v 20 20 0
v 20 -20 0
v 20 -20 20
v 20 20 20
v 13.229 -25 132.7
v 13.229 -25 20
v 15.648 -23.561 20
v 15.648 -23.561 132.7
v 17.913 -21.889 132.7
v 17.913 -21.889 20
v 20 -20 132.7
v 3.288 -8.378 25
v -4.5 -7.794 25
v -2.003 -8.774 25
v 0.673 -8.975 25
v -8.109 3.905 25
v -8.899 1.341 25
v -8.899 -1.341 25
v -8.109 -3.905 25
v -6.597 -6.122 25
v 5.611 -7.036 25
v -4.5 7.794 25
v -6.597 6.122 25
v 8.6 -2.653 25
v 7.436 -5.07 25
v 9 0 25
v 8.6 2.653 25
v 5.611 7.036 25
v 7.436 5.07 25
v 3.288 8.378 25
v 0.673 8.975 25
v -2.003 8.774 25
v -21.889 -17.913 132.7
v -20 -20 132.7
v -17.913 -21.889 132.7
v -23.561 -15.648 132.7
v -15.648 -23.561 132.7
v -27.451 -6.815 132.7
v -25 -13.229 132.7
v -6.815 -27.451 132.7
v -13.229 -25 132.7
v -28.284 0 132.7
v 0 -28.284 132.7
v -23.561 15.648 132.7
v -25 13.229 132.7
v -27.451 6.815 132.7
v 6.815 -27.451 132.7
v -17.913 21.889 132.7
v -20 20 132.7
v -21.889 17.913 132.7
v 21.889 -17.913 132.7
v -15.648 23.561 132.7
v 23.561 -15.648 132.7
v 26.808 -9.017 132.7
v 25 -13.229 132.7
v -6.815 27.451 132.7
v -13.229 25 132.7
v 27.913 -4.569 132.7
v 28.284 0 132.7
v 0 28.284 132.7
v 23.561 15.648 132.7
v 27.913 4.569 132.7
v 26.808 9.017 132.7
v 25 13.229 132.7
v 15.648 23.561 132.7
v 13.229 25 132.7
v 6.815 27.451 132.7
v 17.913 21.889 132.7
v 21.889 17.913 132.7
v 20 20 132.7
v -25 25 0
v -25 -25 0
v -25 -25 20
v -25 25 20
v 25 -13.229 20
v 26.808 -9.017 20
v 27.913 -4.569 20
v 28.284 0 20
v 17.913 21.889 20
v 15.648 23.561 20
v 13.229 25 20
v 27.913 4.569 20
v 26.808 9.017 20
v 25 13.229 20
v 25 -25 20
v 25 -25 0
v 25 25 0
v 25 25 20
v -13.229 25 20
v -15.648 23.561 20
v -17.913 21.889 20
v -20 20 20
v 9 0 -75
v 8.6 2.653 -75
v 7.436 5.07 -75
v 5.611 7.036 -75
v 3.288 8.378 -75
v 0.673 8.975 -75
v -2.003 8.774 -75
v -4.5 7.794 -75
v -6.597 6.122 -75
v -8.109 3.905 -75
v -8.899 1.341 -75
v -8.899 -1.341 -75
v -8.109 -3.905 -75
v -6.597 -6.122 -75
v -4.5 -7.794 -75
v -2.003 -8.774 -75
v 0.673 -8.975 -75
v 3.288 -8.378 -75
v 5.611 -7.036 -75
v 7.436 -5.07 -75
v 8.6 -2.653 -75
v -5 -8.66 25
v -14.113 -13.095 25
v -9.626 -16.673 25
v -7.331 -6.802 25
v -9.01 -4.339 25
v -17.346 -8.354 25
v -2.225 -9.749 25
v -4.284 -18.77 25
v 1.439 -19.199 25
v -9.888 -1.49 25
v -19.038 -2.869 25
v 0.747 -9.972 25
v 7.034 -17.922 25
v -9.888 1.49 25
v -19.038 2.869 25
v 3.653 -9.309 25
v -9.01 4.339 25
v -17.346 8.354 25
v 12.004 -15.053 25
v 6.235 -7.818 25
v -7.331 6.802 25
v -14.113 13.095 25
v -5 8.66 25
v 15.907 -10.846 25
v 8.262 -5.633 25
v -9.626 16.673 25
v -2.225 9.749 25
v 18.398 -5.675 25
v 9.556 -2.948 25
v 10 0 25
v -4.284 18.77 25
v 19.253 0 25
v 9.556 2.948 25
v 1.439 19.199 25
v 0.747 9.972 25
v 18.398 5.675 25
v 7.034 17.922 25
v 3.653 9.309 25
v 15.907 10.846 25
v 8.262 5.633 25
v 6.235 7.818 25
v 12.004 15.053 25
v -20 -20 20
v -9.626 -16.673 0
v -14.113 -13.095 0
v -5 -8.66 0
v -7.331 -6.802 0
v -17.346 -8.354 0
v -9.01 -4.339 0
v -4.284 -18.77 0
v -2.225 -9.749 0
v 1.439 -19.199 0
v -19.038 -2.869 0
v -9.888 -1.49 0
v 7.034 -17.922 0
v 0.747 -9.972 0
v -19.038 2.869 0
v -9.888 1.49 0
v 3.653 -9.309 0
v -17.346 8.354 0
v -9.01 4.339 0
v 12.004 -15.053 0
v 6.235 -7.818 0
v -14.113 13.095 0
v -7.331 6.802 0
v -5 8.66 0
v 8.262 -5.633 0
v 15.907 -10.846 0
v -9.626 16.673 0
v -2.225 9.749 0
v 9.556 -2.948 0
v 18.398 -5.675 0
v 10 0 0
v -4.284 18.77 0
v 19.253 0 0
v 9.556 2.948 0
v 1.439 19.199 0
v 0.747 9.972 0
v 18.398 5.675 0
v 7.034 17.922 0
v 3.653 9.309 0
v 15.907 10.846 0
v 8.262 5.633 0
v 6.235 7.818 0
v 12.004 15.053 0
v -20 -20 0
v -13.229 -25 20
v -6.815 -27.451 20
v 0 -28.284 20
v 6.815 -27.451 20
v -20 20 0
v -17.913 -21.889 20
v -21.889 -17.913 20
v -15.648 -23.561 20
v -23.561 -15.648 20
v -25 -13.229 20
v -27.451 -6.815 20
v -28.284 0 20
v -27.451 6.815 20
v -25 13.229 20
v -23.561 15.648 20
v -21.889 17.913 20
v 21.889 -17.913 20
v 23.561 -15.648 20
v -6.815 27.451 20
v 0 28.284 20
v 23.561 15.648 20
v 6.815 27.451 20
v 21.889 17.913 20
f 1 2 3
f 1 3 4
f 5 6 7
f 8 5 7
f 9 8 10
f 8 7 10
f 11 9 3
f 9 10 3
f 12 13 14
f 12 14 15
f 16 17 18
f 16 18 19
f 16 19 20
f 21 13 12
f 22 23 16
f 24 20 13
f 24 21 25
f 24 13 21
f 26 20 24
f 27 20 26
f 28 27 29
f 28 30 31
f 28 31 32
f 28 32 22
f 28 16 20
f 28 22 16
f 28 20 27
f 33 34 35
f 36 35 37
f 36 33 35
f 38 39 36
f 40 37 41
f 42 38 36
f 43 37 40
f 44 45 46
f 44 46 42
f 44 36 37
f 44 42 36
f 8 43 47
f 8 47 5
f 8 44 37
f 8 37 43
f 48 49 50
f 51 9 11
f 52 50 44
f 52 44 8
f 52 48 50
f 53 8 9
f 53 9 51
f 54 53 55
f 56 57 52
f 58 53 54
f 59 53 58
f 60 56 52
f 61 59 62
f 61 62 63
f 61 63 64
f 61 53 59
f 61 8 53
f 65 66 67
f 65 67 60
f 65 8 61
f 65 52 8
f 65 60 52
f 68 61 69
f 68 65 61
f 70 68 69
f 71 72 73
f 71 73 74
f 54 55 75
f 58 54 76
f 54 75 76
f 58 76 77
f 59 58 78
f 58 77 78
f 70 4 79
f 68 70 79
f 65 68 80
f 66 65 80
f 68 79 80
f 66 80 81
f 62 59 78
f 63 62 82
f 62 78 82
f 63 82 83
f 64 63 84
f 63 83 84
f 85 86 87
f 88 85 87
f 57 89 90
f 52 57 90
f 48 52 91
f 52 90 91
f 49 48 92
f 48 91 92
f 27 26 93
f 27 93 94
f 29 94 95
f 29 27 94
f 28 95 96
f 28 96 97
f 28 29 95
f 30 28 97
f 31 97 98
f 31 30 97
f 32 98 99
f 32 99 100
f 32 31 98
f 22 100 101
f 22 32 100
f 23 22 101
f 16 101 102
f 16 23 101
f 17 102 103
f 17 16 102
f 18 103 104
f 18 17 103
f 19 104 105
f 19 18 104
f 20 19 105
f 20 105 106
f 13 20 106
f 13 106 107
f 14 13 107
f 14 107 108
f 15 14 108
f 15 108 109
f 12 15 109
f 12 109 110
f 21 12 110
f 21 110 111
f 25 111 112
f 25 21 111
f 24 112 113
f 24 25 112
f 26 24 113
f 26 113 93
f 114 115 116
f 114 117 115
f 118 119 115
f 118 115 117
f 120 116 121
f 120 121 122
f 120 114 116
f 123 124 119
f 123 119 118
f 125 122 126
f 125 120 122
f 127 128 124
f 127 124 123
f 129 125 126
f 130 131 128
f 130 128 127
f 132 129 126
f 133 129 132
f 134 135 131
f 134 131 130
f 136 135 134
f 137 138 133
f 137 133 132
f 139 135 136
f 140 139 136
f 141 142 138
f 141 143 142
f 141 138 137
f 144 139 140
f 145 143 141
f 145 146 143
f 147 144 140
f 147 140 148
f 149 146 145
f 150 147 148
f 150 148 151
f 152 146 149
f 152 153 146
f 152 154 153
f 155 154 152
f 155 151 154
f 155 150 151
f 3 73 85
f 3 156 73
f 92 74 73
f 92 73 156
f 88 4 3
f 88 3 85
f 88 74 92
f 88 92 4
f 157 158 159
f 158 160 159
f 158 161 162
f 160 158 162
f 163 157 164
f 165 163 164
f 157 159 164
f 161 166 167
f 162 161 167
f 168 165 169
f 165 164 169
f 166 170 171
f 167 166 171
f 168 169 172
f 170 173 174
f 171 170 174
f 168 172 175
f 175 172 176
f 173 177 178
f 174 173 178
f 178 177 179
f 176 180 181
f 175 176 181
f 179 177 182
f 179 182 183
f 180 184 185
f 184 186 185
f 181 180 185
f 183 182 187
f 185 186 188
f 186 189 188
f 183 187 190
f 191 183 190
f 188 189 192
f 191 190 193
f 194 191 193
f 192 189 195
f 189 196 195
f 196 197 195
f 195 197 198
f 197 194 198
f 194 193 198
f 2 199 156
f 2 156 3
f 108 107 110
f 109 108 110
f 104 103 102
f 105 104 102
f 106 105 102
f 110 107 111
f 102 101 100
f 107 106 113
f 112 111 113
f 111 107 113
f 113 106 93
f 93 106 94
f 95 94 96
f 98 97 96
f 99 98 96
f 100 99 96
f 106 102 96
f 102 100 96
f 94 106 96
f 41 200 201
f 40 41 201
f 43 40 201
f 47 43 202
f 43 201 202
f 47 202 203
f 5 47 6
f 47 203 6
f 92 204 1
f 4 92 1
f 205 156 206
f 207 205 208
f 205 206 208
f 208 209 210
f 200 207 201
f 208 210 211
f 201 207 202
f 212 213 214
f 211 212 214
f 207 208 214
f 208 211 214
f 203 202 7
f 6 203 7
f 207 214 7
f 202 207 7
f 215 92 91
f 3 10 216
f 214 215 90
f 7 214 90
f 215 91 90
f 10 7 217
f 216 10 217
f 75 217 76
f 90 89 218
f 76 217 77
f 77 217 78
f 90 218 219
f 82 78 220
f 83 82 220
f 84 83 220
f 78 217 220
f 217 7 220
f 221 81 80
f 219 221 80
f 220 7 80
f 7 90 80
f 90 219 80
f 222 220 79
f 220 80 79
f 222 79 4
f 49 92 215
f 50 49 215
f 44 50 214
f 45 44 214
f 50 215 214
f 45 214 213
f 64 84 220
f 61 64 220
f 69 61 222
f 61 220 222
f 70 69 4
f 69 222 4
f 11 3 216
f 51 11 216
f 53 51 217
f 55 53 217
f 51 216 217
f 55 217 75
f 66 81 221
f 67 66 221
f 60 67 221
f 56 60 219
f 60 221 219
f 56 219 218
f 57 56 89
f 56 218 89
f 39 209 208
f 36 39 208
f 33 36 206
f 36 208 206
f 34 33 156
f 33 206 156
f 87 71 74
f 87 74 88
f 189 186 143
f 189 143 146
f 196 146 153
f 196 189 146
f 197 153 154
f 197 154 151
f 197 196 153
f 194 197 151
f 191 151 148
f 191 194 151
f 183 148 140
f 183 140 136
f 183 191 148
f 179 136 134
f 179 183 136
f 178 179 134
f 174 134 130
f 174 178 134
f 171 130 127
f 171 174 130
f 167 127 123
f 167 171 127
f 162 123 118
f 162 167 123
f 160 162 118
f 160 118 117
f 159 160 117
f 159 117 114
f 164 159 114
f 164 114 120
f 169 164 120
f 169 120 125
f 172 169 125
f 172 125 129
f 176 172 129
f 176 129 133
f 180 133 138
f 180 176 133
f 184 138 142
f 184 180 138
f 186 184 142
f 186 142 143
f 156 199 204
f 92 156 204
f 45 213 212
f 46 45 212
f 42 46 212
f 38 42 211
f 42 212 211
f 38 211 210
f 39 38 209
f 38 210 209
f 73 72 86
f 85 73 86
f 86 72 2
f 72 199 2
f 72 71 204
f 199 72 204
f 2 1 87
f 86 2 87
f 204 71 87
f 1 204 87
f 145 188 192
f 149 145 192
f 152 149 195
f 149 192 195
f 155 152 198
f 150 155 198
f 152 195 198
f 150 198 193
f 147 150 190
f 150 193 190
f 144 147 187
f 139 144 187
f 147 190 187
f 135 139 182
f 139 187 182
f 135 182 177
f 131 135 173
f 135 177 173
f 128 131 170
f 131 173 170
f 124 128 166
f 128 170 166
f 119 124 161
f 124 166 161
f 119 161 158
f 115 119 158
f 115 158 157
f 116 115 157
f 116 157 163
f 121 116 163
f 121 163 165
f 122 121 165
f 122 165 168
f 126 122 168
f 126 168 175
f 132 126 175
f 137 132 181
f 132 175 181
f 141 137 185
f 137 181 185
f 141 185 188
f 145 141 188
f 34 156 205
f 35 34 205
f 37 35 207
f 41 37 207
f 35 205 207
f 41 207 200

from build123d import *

# Parameters (mm, degrees)
F0_R     = 19.2528959131
F0_R_2   = 10
F1_DEPTH = 25
F0_W     = 50
F0_H     = 50
F0_W_2   = 40
F0_H_2   = 40
F2_DEPTH = 20
F3_R     = 9
F4_DEPTH = 100
F5_W     = 40
F5_H     = 40
F6_DEPTH = 112.7


with BuildPart() as f1:
    # F0 (on Top) → F1 (new body)
    with BuildSketch(Plane.XY):
        Circle(F0_R)
        Circle(F0_R_2, mode=Mode.SUBTRACT)
    extrude(amount=F1_DEPTH)


with BuildPart() as f2:
    # F0 (on Top) → F2 (new body)
    with BuildSketch(Plane.XY):
        Rectangle(F0_W, F0_H)
        Rectangle(F0_W_2, F0_H_2, mode=Mode.SUBTRACT)
    extrude(amount=F2_DEPTH)


with BuildPart() as f4:
    # F3 (on face) → F4 (new body)
    with BuildSketch(Plane.XY.offset(25)):
        Circle(F3_R)
    extrude(amount=-F4_DEPTH)


with BuildPart() as f6:
    # F5 (on face) → F6 (new body)
    with BuildSketch(Plane.XY.offset(20)):
        with BuildLine():
            ThreePointArc((25, -13.2287565553), (27.4509269533, -6.8151749359), (28.2842712475, 0))
            ThreePointArc((28.2842712475, 0), (27.4509269533, 6.8151749359), (25, 13.2287565553))
            Line((25, 13.2287565553), (25, -13.2287565553))
        make_face()
        with BuildLine():
            Line((25, -13.2287565553), (25, 13.2287565553))
            ThreePointArc((25, 13.2287565553), (22.7532950239, 16.8014155818), (20, 20))
            Line((20, 20), (20, -20))
            ThreePointArc((20, -20), (22.7532950239, -16.8014155818), (25, -13.2287565553))
        make_face()
        with BuildLine():
            Line((-20, 20), (20, 20))
            ThreePointArc((20, 20), (16.8014155818, 22.7532950239), (13.2287565553, 25))
            Line((13.2287565553, 25), (-13.2287565553, 25))
            ThreePointArc((-13.2287565553, 25), (-16.8014155818, 22.7532950239), (-20, 20))
        make_face()
        Rectangle(F5_W, F5_H)
        with BuildLine():
            ThreePointArc((13.2287565553, -25), (16.8014155818, -22.7532950239), (20, -20))
            Line((20, -20), (-20, -20))
            ThreePointArc((-20, -20), (-16.8014155818, -22.7532950239), (-13.2287565553, -25))
            Line((-13.2287565553, -25), (13.2287565553, -25))
        make_face()
        with BuildLine():
            Line((-13.2287565553, 25), (13.2287565553, 25))
            ThreePointArc((13.2287565553, 25), (0, 28.2842712475), (-13.2287565553, 25))
        make_face()
        with BuildLine():
            Line((-20, -20), (-20, 20))
            ThreePointArc((-20, 20), (-22.7532950239, 16.8014155818), (-25, 13.2287565553))
            Line((-25, 13.2287565553), (-25, -13.2287565553))
            ThreePointArc((-25, -13.2287565553), (-22.7532950239, -16.8014155818), (-20, -20))
        make_face()
        with BuildLine():
            ThreePointArc((-13.2287565553, -25), (0, -28.2842712475), (13.2287565553, -25))
            Line((13.2287565553, -25), (-13.2287565553, -25))
        make_face()
        with BuildLine():
            Line((-25, -13.2287565553), (-25, 13.2287565553))
            ThreePointArc((-25, 13.2287565553), (-28.2842712475, 0), (-25, -13.2287565553))
        make_face()
    extrude(amount=F6_DEPTH)


solid = Compound([f1.part, f2.part, f4.part, f6.part])
